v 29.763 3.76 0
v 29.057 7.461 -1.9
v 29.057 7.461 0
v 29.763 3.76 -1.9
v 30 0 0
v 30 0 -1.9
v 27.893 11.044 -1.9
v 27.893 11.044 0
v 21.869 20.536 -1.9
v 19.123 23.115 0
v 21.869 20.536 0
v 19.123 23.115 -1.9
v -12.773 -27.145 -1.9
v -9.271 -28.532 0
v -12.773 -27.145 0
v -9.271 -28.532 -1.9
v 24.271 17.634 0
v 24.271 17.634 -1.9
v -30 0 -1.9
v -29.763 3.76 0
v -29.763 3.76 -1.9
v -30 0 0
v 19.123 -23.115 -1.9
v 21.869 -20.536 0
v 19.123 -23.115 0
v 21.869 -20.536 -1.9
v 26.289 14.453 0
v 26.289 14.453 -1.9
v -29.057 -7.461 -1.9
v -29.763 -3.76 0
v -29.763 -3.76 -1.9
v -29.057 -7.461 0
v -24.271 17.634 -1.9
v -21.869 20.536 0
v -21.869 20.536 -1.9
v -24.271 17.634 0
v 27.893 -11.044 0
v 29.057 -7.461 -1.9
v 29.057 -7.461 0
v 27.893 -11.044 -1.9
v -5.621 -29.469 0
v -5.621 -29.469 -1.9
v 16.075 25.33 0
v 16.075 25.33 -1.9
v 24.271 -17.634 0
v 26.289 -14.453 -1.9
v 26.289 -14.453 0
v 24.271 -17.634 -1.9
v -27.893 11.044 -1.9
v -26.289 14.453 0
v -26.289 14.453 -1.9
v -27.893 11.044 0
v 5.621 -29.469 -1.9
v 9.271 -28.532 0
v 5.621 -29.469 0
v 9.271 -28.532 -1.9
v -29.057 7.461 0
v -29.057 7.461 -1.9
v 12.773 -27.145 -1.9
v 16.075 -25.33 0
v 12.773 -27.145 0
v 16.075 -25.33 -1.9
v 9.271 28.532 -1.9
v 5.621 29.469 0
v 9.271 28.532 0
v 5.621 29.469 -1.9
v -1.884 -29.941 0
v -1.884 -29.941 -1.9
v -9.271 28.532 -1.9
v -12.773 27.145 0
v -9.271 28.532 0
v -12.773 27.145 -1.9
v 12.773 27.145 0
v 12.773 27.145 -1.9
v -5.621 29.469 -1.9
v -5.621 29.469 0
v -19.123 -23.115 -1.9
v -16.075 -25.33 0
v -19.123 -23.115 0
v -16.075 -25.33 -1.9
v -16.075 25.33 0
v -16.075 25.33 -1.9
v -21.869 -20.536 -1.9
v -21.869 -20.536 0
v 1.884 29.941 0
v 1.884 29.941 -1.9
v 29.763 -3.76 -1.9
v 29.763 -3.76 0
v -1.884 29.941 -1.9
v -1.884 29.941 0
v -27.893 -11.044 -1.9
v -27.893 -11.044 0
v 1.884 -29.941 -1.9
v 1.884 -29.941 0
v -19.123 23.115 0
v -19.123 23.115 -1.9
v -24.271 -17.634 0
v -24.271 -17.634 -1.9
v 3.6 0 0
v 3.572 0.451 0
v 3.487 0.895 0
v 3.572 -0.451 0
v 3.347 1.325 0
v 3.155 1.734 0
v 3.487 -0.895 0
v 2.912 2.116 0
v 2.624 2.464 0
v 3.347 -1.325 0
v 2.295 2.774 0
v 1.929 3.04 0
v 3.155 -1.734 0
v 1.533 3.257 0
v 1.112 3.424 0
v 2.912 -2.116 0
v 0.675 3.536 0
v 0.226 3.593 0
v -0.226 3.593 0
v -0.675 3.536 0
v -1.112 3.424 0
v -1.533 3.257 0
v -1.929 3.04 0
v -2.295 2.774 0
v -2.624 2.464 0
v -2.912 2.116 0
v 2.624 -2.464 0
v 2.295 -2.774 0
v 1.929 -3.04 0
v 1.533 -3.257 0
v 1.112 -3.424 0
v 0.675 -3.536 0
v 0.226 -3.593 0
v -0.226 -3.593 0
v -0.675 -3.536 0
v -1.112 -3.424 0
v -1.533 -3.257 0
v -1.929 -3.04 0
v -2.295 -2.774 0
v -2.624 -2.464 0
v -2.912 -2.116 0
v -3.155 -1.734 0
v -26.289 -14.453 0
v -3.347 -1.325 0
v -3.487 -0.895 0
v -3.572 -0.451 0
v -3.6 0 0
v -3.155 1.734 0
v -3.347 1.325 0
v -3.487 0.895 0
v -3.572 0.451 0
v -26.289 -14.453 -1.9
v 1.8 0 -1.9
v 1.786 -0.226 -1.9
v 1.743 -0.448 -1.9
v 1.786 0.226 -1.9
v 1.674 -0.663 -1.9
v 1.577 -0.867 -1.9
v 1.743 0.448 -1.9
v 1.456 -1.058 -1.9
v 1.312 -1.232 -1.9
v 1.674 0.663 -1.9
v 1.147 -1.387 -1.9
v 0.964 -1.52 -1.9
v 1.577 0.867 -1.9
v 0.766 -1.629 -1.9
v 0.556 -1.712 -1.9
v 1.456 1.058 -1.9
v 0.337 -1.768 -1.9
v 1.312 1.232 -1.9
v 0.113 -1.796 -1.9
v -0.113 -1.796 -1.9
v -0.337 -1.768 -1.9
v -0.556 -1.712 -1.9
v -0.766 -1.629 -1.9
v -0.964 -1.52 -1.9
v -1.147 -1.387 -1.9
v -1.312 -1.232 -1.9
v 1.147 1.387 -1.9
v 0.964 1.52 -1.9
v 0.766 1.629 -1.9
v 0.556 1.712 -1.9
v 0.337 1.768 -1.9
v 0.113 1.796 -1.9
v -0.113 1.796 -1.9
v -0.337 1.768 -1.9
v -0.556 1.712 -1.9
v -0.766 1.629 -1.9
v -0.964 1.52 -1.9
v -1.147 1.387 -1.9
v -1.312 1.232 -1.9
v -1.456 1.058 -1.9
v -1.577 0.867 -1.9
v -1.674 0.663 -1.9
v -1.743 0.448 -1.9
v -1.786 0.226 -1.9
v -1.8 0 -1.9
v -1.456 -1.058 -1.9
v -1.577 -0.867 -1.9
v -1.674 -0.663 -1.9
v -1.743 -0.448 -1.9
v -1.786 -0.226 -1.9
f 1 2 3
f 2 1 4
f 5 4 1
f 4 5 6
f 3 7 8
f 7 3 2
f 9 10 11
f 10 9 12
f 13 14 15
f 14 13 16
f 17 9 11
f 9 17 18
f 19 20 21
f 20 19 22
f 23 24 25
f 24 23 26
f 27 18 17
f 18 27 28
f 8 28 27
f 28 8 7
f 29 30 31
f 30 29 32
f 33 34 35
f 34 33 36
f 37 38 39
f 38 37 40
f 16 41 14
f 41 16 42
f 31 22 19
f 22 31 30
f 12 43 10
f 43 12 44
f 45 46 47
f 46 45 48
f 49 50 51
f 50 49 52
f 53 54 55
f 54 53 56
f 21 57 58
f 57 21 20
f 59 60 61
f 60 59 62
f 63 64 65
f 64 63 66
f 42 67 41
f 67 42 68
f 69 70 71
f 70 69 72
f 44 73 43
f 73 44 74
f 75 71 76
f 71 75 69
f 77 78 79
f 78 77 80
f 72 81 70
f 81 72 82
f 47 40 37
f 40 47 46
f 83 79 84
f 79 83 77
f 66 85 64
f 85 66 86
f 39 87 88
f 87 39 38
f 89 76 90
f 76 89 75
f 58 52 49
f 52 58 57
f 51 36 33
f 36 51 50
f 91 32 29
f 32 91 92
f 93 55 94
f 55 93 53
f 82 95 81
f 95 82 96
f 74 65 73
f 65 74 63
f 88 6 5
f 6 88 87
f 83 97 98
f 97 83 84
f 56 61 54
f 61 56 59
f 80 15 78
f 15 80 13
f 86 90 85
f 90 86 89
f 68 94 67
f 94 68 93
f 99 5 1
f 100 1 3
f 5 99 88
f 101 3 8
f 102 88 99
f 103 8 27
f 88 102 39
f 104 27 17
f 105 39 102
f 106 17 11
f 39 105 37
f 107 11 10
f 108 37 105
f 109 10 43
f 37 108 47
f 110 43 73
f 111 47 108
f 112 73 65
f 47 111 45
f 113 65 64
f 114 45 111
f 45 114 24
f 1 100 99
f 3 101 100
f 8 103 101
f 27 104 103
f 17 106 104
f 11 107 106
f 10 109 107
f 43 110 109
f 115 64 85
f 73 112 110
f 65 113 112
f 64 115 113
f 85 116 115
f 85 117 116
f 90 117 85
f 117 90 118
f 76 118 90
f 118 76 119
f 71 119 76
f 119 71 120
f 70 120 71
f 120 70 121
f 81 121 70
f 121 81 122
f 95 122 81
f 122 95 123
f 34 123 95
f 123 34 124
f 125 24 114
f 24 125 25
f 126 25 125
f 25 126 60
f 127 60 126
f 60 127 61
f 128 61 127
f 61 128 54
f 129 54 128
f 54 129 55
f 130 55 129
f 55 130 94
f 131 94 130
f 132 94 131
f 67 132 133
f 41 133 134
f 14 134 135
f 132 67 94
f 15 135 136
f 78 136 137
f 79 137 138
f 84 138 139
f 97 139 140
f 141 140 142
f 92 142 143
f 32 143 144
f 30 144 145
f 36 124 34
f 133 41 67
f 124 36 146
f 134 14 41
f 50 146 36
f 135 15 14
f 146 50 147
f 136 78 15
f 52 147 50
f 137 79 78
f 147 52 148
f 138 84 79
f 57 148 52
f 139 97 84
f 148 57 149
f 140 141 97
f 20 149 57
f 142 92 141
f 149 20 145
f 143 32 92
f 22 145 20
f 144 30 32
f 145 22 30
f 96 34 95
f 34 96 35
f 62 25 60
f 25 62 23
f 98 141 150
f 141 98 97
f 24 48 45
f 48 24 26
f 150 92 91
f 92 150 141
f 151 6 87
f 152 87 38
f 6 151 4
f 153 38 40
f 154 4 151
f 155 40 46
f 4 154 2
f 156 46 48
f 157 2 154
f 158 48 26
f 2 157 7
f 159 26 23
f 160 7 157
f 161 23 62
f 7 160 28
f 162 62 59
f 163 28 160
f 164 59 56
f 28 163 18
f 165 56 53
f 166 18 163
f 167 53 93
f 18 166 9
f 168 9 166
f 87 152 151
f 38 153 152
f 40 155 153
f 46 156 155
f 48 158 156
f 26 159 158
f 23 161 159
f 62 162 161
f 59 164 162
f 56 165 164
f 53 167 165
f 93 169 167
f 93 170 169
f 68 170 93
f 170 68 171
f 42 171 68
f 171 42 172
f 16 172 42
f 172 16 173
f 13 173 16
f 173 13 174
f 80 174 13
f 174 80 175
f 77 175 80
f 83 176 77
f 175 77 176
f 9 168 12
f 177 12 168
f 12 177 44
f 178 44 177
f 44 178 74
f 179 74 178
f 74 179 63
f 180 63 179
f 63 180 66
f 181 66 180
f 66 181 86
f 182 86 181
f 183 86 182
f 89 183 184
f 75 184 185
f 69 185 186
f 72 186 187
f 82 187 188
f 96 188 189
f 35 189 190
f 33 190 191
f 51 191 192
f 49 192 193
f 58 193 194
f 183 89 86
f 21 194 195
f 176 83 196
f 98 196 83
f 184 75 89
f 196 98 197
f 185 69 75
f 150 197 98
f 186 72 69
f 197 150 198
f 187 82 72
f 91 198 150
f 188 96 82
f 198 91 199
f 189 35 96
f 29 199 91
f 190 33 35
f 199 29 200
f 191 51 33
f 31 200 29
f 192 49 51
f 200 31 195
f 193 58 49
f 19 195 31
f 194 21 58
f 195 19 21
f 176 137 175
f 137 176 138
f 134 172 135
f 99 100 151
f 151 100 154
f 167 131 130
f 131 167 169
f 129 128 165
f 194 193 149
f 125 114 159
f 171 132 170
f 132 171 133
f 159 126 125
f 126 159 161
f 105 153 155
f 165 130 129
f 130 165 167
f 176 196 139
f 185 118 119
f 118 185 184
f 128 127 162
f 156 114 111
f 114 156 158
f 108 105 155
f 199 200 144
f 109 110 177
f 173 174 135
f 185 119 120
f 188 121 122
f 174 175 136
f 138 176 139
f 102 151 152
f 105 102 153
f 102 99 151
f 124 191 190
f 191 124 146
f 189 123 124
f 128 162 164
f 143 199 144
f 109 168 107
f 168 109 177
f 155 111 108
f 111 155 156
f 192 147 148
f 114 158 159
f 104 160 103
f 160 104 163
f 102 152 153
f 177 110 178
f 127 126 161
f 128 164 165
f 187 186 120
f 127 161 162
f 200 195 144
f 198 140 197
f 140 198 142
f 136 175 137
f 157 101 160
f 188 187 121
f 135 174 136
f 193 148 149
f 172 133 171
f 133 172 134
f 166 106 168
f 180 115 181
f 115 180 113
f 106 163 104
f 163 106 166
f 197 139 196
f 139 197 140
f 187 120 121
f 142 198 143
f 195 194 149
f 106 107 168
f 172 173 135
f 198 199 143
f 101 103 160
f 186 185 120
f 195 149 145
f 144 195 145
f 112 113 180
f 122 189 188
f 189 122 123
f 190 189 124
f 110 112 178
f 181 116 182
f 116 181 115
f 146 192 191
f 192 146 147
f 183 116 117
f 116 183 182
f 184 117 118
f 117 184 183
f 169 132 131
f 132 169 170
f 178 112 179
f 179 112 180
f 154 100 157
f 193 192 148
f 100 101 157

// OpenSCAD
$fn = 50;


difference() {
	union() {
		translate(v = [0, 0, -1.9000000000]) {
			cylinder(h = 1.9000000000, r = 30.0000000000);
		}
		translate(v = [0, 0, -1.9000000000]) {
			cylinder(h = 1.9000000000, r = 2.8750000000);
		}
	}
	union() {
		translate(v = [0, 0, 0]) {
			rotate(a = [0, 0, 0]) {
				difference() {
					union() {
						translate(v = [0, 0, -1.9000000000]) {
							cylinder(h = 1.9000000000, r = 1.5000000000);
						}
						translate(v = [0, 0, -1.9000000000]) {
							cylinder(h = 1.9000000000, r1 = 1.8000000000, r2 = 3.6000000000);
						}
						translate(v = [0, 0, -1.9000000000]) {
							cylinder(h = 1.9000000000, r = 1.8000000000);
						}
						translate(v = [0, 0, -1.9000000000]) {
							cylinder(h = 1.9000000000, r = 1.5000000000);
						}
					}
					union();
				}
			}
		}
	}
}
